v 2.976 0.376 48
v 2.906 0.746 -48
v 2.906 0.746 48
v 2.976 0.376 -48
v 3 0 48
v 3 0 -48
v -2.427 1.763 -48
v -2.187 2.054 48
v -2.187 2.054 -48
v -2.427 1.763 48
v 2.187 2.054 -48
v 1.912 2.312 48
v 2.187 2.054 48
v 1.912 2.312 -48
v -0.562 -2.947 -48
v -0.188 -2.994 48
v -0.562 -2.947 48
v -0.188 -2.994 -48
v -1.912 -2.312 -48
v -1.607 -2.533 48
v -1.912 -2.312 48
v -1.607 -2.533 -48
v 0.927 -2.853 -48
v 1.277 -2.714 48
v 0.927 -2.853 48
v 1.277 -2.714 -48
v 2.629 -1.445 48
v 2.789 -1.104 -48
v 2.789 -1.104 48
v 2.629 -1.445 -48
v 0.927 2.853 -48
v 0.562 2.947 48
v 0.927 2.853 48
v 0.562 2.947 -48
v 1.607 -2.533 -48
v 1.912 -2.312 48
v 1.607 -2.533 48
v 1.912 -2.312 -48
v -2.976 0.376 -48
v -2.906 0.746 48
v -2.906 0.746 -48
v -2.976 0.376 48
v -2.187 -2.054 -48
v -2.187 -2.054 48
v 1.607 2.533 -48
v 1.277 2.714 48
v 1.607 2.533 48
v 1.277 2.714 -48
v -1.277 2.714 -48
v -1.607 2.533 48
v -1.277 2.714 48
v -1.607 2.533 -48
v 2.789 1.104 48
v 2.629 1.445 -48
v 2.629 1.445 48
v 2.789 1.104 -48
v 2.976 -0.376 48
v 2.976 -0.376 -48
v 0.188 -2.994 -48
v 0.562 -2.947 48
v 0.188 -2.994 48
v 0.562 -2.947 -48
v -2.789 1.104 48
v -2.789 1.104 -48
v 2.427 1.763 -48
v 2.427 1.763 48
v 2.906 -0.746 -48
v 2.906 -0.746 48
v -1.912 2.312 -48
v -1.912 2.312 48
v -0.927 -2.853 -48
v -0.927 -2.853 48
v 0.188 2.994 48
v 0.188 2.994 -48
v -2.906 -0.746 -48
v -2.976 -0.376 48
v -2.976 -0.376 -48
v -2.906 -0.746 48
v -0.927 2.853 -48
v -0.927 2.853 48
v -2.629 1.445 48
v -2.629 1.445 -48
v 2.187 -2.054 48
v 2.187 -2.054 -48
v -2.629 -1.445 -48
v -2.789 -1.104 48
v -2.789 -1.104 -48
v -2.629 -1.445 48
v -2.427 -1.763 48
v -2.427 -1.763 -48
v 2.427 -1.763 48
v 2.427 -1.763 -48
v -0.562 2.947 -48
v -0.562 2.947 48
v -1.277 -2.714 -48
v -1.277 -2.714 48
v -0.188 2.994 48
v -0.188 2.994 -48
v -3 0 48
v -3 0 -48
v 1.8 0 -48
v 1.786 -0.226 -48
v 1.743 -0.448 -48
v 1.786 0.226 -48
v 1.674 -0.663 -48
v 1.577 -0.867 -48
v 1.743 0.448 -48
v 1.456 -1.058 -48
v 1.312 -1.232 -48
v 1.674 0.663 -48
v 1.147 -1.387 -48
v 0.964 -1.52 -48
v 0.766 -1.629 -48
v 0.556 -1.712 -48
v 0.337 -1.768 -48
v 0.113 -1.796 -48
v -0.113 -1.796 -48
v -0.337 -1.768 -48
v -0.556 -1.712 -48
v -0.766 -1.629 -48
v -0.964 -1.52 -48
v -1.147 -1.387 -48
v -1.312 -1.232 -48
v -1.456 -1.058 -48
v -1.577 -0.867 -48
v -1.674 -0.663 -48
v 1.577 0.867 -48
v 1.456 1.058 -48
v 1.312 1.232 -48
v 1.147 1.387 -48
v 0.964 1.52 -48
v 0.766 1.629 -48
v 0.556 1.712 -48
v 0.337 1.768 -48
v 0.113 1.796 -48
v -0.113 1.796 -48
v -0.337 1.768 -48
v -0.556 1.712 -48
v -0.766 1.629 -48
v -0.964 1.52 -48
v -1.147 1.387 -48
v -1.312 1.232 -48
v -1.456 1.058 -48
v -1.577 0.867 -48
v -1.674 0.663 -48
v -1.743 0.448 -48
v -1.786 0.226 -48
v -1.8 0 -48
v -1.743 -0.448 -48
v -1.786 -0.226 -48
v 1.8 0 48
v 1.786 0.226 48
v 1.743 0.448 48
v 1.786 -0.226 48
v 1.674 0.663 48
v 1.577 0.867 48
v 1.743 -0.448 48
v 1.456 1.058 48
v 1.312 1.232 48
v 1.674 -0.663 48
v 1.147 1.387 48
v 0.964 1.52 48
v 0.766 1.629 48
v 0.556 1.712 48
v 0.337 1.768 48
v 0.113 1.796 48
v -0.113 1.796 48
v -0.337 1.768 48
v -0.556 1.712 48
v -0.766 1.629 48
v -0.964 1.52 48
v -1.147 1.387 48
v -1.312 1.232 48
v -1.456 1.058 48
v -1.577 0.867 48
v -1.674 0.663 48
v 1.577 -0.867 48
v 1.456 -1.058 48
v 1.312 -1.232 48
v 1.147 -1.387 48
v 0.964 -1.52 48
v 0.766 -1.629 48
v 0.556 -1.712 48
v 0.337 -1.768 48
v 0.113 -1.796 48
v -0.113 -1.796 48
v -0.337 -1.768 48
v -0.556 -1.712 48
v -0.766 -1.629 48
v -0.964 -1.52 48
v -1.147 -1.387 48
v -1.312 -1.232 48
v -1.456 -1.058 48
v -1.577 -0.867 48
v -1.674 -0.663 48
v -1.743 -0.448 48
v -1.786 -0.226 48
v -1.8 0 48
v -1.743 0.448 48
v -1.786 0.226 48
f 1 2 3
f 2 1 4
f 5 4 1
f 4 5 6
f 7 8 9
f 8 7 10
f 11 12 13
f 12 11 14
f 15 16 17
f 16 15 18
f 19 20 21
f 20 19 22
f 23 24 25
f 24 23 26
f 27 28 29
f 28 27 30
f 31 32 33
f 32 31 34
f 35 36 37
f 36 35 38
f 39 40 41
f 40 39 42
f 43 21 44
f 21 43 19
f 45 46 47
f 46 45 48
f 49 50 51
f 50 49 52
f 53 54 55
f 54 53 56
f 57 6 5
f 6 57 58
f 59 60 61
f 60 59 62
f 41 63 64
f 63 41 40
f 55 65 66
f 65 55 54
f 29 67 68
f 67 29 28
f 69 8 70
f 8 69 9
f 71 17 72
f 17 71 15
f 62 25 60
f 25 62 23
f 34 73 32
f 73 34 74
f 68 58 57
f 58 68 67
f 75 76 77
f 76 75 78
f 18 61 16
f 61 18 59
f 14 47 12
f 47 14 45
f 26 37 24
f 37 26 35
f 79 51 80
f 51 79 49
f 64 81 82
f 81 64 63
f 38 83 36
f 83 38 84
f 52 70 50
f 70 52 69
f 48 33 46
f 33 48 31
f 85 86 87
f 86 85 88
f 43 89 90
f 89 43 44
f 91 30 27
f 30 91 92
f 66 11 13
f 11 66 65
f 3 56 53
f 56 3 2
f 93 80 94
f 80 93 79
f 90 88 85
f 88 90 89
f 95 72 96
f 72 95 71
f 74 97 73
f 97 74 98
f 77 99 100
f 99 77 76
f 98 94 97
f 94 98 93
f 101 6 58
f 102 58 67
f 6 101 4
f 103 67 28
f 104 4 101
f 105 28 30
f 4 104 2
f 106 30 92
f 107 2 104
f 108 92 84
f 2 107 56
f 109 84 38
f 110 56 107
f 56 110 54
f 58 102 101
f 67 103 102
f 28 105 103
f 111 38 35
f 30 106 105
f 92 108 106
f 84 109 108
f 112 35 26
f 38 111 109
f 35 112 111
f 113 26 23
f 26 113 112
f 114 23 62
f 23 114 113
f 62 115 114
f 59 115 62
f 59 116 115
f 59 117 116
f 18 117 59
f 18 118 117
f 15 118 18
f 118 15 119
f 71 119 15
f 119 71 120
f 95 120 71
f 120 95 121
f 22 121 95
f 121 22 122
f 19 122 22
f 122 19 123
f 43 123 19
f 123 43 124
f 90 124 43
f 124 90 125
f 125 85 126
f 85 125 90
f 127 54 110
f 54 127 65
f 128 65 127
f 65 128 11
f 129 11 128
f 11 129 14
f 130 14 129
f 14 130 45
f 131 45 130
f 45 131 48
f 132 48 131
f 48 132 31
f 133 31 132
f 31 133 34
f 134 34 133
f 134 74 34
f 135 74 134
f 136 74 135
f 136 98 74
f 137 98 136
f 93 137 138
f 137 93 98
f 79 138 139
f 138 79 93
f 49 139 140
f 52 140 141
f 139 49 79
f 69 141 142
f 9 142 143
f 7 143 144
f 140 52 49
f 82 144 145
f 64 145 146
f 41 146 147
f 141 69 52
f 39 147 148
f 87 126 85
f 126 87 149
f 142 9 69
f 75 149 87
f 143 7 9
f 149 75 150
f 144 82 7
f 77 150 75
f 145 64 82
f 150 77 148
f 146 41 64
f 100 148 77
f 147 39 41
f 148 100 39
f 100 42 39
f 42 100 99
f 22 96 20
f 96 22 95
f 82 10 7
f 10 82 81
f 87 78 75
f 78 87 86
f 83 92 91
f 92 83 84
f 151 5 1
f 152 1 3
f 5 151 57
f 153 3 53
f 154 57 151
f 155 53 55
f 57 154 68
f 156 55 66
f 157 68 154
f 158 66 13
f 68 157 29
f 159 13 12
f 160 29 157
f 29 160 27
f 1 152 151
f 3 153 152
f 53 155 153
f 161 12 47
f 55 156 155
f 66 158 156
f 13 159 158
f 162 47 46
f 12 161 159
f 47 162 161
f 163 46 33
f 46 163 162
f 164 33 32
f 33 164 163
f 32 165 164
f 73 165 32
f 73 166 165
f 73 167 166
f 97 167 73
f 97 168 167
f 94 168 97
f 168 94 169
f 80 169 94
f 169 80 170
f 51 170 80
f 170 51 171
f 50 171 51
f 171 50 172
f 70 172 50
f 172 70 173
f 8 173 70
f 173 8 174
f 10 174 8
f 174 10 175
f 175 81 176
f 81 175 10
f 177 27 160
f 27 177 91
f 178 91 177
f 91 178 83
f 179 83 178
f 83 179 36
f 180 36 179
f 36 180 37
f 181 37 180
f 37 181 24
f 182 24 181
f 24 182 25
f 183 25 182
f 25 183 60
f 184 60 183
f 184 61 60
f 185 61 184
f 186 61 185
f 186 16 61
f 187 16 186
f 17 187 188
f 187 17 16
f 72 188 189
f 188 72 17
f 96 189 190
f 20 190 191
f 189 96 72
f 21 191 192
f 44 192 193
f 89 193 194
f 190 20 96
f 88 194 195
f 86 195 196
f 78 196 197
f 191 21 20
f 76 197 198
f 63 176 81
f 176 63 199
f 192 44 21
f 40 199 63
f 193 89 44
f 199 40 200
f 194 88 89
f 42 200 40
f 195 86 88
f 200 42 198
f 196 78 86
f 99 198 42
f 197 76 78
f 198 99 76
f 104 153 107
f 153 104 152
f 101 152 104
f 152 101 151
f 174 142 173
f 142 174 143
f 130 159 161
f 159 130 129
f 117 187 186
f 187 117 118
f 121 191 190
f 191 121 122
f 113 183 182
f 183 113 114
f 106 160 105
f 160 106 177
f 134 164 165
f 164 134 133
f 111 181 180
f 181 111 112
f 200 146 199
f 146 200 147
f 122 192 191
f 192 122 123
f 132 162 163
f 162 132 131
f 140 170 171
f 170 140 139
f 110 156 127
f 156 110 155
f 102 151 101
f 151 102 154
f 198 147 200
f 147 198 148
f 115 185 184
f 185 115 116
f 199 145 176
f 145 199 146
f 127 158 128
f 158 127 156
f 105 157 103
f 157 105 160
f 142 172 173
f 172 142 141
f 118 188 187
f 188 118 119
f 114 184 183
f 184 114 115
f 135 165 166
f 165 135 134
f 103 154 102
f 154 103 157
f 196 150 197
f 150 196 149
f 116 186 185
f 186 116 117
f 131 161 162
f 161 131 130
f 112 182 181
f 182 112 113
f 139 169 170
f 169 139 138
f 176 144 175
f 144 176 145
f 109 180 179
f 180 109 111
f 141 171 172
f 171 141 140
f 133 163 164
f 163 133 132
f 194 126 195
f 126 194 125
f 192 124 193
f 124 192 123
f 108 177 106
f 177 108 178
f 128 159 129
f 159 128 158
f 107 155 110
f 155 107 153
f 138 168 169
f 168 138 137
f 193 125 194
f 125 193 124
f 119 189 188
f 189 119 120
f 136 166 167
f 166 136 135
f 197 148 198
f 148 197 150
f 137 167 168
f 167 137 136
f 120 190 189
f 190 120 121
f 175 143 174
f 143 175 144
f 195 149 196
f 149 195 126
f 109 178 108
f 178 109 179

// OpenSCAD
$fn = 50;


difference() {
	union() {
		translate(v = [0, 0, -48.0000000000]) {
			cylinder(h = 96, r = 3.0000000000);
		}
	}
	union() {
		#translate(v = [0, 0, -100.0000000000]) {
			cylinder(h = 200, r = 1.8000000000);
		}
	}
}
